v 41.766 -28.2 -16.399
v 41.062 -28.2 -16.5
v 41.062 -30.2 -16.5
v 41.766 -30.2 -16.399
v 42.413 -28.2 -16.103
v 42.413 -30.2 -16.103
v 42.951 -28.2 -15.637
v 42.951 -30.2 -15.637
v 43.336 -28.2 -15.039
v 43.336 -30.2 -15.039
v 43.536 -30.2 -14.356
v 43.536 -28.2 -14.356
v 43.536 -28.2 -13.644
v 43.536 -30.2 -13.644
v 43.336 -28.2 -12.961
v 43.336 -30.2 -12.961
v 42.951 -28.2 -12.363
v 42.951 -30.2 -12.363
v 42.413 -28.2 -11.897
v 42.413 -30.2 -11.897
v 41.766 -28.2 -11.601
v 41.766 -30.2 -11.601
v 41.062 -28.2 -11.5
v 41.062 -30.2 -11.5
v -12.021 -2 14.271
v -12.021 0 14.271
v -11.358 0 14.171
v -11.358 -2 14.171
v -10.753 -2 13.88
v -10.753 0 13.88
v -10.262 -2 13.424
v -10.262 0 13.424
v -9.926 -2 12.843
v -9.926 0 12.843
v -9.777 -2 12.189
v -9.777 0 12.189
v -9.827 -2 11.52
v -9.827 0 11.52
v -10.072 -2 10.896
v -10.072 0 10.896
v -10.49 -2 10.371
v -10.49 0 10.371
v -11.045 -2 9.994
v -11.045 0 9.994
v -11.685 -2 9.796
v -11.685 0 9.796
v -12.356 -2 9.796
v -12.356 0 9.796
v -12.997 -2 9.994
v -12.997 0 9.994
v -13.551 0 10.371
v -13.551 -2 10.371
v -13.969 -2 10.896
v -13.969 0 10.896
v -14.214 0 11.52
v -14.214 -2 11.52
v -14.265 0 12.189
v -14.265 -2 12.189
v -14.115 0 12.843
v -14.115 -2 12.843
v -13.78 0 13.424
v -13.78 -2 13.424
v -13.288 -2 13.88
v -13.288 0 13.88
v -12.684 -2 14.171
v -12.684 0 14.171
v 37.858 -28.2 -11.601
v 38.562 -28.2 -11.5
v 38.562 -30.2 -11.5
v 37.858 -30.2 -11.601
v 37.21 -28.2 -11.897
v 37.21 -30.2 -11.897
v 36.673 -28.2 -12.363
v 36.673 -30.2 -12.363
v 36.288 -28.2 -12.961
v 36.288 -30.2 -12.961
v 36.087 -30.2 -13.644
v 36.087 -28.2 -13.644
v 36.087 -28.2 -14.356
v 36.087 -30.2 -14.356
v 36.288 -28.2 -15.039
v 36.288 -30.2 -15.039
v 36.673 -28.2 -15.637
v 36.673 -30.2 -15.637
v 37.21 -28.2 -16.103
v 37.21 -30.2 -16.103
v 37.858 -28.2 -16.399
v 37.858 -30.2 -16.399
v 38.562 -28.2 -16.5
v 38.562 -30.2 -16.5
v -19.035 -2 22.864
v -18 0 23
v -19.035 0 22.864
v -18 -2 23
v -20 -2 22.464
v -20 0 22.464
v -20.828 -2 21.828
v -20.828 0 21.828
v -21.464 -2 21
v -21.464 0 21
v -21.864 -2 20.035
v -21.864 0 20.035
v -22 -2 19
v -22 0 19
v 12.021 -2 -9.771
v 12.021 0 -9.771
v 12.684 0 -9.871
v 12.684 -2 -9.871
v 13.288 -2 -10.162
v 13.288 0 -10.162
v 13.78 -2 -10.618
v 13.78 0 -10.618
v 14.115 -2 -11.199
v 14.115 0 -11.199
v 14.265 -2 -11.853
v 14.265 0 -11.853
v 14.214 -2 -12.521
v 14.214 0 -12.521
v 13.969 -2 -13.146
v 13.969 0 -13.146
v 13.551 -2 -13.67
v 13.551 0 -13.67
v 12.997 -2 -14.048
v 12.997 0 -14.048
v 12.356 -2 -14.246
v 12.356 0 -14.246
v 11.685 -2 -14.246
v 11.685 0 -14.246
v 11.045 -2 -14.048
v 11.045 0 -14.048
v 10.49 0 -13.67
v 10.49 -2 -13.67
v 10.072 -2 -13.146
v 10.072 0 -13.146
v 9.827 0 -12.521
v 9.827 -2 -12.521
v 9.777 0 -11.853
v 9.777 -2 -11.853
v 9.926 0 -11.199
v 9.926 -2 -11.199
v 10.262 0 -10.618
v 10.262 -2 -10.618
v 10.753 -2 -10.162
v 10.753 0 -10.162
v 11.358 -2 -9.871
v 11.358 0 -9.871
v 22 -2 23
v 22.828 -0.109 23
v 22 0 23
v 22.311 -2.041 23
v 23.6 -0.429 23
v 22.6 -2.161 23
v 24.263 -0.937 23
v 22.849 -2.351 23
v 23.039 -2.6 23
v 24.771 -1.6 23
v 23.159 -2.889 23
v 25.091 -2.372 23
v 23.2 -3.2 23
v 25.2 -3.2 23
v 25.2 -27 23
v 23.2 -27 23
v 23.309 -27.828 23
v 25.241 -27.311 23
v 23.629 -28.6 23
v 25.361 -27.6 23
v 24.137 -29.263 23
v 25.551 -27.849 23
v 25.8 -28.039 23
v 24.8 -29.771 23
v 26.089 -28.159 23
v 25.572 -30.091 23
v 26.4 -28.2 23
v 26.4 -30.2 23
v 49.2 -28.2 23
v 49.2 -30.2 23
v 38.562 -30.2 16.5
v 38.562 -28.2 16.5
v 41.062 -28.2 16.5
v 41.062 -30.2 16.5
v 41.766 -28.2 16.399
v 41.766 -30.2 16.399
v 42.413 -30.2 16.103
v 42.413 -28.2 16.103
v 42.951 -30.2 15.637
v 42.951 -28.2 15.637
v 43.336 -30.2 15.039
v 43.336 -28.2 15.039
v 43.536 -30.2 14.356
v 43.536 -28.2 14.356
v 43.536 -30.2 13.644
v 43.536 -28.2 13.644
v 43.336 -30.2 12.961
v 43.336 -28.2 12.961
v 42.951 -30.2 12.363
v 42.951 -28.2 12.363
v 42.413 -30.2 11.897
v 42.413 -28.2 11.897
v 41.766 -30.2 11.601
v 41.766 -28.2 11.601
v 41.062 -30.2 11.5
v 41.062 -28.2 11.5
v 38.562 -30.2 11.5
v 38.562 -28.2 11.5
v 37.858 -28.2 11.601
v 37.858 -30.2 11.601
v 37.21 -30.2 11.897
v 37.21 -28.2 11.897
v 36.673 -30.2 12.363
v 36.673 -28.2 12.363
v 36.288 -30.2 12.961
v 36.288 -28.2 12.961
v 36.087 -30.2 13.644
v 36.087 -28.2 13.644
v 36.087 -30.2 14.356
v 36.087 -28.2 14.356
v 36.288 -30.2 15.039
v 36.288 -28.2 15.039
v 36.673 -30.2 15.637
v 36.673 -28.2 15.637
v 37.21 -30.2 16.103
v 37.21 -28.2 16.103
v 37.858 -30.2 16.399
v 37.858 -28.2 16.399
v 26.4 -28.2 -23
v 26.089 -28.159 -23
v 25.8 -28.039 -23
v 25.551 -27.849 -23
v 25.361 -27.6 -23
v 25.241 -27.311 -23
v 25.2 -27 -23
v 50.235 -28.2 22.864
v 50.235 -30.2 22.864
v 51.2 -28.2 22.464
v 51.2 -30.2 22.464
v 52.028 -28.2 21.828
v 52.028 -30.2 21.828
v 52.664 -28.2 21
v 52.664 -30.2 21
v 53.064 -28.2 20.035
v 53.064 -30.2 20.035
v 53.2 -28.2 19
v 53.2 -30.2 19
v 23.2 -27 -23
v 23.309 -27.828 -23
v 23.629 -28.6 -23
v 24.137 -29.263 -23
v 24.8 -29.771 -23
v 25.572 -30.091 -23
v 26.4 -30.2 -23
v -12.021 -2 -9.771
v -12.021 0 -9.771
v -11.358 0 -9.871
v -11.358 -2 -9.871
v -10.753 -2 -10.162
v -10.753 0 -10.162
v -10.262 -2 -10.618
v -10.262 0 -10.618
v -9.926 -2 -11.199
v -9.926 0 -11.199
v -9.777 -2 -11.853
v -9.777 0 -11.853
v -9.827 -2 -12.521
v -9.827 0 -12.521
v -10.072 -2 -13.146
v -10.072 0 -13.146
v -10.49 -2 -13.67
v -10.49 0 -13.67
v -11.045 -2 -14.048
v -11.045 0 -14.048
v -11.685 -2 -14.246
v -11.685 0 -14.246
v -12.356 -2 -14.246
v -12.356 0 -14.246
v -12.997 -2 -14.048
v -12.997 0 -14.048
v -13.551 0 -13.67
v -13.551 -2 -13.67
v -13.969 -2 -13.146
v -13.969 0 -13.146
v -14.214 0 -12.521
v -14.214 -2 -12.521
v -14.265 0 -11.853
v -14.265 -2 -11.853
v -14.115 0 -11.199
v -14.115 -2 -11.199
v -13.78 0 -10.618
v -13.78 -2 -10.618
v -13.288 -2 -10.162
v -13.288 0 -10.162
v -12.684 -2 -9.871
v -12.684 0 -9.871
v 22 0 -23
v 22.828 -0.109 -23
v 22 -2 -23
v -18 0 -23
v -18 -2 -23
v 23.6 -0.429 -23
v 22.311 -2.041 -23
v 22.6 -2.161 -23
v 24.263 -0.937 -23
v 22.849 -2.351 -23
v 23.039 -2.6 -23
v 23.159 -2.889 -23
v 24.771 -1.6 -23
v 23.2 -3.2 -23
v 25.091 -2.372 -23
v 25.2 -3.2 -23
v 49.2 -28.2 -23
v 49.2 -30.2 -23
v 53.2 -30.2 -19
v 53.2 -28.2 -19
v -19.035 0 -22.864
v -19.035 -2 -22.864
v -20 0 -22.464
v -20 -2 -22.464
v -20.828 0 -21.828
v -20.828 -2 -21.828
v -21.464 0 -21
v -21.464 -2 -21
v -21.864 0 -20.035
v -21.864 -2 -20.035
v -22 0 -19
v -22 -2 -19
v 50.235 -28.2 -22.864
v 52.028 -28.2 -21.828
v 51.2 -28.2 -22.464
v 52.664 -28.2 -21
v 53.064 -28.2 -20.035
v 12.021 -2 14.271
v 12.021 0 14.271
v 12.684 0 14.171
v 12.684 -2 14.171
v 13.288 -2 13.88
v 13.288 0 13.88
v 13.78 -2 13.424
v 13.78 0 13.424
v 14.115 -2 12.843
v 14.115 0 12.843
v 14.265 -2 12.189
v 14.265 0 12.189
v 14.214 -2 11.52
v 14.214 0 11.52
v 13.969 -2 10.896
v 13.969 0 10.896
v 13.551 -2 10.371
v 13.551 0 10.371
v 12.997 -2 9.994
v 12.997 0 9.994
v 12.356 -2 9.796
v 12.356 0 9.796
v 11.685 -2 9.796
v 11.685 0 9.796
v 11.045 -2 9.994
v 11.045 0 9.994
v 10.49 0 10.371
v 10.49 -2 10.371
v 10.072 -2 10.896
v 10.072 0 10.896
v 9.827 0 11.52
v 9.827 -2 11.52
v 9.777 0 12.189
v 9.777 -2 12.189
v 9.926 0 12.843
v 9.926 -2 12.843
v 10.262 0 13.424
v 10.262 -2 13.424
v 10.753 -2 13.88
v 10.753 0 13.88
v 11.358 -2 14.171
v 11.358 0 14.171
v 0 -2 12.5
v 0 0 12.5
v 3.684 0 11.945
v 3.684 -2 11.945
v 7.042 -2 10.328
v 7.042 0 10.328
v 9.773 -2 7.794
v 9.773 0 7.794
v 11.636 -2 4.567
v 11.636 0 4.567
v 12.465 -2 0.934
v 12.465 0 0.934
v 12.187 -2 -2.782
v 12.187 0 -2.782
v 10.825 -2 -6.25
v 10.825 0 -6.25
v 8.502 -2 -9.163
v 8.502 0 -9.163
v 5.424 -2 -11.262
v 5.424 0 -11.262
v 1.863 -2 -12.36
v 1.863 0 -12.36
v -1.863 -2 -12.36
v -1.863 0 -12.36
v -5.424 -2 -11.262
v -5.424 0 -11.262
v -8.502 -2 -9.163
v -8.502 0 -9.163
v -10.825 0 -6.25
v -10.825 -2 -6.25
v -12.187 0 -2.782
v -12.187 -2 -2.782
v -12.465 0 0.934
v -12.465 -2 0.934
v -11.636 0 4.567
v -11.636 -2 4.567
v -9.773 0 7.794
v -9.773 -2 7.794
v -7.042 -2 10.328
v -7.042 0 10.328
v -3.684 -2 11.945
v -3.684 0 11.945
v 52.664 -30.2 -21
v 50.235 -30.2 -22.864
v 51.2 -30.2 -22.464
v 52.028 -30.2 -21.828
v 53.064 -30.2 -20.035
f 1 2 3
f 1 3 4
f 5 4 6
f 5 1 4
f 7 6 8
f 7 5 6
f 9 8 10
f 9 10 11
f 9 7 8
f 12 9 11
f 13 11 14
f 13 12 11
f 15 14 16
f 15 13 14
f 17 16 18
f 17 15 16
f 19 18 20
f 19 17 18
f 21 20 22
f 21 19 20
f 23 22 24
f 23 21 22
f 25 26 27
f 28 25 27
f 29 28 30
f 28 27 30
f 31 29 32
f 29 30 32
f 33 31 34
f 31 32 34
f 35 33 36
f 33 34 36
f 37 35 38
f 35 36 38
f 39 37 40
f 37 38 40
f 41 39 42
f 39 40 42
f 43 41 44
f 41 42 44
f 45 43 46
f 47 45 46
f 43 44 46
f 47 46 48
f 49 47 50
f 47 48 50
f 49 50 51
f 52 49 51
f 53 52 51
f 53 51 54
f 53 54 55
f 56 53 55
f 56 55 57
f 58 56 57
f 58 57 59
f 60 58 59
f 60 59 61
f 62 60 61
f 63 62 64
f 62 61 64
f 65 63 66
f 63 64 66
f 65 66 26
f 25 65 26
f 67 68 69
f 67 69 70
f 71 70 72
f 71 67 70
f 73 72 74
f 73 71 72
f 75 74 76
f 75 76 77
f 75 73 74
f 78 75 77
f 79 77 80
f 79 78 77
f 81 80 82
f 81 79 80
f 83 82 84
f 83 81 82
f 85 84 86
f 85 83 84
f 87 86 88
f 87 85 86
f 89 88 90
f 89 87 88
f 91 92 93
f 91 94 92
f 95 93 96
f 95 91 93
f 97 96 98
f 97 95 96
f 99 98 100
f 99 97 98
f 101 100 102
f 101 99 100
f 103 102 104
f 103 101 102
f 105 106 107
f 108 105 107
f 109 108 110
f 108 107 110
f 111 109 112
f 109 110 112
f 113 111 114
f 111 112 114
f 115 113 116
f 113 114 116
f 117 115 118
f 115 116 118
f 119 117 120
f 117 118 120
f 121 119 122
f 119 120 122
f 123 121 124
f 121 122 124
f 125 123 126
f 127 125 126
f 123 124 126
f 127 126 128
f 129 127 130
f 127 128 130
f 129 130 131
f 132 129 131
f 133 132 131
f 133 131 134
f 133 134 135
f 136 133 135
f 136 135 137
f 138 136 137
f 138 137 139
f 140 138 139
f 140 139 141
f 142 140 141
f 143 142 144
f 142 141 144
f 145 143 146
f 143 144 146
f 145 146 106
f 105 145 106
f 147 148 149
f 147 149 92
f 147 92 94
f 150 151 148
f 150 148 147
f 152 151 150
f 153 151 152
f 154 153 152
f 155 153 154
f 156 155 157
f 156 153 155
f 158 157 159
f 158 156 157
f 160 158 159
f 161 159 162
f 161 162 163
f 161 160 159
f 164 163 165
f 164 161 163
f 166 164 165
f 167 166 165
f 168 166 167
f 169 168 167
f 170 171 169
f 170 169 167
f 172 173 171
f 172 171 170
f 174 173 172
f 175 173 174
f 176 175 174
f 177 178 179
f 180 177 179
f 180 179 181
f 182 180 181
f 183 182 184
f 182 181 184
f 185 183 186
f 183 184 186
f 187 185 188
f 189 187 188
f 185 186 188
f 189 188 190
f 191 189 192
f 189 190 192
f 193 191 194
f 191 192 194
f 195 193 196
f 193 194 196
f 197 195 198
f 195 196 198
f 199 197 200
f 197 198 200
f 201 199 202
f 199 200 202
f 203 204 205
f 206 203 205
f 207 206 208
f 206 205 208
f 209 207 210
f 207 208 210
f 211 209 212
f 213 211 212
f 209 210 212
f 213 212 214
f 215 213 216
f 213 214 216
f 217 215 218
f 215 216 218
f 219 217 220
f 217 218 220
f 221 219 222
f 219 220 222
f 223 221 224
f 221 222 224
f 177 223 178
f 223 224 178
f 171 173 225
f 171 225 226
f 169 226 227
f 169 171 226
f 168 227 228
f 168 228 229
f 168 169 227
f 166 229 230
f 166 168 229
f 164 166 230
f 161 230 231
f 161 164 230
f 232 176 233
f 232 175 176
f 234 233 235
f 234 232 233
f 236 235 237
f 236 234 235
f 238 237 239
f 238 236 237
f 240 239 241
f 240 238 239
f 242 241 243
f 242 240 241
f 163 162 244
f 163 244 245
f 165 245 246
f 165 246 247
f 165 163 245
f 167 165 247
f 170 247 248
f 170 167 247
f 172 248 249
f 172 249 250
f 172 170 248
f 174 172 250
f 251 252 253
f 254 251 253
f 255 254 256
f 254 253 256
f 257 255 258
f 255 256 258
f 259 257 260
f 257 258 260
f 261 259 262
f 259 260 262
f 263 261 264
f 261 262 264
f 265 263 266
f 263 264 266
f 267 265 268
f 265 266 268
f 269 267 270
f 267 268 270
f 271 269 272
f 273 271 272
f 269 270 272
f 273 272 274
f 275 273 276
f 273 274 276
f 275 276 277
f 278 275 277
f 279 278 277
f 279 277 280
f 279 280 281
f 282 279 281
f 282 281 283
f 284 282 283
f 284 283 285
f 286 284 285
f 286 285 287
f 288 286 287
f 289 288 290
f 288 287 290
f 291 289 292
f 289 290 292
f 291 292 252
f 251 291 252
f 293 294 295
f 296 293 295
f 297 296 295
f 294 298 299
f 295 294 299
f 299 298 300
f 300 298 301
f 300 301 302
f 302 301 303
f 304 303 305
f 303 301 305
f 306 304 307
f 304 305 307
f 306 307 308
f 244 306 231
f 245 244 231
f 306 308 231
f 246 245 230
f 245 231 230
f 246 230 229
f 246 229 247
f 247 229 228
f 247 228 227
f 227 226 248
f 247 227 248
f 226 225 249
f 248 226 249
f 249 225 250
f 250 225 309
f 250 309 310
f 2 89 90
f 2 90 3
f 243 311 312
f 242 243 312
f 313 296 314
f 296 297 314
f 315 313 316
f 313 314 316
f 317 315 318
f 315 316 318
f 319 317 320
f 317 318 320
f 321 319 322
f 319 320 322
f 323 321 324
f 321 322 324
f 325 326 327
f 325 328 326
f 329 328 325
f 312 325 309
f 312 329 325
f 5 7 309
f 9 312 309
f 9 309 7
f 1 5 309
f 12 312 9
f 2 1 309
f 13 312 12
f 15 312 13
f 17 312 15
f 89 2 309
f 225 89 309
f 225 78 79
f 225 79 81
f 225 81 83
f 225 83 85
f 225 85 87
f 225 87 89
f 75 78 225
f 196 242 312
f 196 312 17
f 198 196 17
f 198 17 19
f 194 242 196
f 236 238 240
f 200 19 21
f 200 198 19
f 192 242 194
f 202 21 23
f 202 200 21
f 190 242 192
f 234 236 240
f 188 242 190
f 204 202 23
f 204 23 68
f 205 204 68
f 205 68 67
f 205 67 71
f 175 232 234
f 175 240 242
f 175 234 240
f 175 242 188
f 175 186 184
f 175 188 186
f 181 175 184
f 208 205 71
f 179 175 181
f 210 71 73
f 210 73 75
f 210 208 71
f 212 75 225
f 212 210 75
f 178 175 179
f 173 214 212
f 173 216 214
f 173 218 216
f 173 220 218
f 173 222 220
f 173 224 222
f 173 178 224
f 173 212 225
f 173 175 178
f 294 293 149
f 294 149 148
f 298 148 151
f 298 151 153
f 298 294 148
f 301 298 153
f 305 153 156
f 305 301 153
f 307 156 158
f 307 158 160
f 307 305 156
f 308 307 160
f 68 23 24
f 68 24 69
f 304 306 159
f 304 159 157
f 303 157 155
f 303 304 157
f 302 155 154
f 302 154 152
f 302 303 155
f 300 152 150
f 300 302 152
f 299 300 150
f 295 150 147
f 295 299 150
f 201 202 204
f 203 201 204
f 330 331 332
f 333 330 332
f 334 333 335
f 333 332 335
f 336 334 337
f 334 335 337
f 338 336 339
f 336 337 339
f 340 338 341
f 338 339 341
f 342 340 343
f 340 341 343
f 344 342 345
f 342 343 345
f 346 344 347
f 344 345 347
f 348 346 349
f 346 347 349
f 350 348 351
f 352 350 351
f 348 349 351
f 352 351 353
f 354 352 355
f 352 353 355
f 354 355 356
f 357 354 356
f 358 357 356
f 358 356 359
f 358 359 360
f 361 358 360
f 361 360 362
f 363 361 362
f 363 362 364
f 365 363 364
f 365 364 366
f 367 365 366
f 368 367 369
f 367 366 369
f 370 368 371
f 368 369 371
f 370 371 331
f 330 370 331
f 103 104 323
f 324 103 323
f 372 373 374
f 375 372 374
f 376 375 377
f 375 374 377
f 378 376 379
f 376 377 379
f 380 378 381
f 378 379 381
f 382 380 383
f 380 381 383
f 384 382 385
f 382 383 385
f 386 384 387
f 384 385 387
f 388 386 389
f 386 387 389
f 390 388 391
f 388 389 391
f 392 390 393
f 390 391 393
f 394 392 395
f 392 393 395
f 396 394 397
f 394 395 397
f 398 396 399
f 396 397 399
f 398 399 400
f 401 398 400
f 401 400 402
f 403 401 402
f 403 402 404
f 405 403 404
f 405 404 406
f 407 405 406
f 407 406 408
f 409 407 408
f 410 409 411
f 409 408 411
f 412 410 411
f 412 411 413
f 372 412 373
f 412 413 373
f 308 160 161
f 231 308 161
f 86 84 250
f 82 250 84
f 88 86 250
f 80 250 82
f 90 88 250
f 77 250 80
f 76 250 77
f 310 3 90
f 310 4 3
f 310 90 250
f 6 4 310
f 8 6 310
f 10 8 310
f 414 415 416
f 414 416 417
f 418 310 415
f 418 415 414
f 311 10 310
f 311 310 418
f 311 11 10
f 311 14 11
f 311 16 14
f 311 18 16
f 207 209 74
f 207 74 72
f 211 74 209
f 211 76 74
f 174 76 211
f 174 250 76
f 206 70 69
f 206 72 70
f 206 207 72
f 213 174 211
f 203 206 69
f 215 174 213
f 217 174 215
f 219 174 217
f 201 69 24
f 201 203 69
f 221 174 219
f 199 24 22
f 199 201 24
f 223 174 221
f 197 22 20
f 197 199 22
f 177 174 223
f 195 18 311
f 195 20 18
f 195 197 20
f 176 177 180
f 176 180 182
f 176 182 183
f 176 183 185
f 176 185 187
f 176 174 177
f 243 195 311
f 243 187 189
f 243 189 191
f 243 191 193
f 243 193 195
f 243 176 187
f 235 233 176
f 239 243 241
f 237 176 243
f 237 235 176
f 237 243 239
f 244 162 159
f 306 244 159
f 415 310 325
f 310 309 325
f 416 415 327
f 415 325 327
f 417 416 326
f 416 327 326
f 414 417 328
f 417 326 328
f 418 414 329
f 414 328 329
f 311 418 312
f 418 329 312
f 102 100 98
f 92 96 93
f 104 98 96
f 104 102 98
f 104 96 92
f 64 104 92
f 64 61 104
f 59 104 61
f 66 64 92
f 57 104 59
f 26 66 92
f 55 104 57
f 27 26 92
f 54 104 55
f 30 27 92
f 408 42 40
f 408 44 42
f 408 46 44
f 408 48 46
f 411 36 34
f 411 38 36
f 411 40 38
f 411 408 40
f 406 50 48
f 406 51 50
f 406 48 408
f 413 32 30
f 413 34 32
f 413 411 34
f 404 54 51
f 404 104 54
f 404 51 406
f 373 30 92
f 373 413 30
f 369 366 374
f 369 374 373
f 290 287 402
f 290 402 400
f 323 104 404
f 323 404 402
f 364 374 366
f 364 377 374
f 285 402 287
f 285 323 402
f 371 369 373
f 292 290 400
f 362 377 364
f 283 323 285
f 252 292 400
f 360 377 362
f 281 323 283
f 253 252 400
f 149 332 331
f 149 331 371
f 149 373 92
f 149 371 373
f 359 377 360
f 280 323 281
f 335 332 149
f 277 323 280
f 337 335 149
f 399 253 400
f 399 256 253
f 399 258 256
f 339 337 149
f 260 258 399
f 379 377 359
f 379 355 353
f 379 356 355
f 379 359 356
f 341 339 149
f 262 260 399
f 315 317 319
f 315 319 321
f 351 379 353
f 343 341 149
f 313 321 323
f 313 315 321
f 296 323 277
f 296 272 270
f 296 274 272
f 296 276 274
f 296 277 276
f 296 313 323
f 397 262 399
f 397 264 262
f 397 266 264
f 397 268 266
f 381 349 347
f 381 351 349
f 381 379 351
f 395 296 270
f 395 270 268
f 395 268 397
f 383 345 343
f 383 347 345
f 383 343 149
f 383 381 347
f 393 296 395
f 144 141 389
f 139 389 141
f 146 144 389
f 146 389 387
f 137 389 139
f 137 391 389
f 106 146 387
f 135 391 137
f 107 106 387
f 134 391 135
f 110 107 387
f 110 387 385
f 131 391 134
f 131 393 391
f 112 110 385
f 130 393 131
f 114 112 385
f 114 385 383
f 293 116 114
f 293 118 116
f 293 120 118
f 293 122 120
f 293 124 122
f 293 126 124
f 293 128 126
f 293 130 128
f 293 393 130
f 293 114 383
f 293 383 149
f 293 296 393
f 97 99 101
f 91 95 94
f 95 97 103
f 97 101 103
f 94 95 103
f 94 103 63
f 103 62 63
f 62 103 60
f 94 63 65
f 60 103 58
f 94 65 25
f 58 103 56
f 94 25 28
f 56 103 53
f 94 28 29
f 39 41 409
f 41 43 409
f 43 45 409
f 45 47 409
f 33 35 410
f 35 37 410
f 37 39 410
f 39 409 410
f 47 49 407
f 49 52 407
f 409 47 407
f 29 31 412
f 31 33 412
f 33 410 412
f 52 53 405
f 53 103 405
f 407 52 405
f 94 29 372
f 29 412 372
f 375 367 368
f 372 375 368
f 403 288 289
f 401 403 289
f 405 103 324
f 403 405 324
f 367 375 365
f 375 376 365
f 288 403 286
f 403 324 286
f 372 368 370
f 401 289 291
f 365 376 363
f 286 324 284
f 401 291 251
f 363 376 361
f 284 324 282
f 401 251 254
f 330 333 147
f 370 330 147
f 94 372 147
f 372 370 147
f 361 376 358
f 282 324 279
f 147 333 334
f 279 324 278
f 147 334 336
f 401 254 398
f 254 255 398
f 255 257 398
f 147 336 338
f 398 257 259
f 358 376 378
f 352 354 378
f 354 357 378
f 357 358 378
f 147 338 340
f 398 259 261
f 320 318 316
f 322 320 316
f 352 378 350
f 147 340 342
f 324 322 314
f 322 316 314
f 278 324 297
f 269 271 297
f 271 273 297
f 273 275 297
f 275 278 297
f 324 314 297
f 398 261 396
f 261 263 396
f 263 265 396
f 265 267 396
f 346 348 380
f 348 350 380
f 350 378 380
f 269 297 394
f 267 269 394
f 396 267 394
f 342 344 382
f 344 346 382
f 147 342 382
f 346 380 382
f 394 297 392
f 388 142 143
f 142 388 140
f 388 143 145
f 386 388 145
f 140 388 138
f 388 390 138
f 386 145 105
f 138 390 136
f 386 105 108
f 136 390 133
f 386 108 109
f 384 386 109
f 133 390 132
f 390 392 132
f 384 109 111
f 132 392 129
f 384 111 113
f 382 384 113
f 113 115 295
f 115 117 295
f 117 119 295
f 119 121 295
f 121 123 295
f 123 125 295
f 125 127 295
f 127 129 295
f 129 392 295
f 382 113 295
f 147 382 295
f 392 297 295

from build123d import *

# Parameters (mm, degrees)
SKETCH1_W          = 44
SKETCH1_H          = 46
SKETCH1_R          = 12.5
SKETCH1_R_2        = 2.25
BASE_FLANGE1_DEPTH = 2
EDGE_FLANGE1_DEPTH = 46
EDGE_FLANGE2_DEPTH = 46
CUT_EXTRUDE1_DEPTH = 2
FILLET1_R          = 4


# Sheet-metal steps are written as plain solids
with BuildPart() as part:
    # Sketch1 → Base-Flange1 (new body)
    with BuildSketch(Plane(origin=(0, 0, 0), x_dir=(1, 0, 0), z_dir=(0, 1, 0))):
        Rectangle(SKETCH1_W, SKETCH1_H)
        with Locations(Location((0, 0, 0), (0, 0, 270))):
            Circle(SKETCH1_R, mode=Mode.SUBTRACT)
        with Locations(Location((12.02081528, 12.02081528, 0), (0, 0, 270))):
            Circle(SKETCH1_R_2, mode=Mode.SUBTRACT)
        with Locations(Location((12.02081528, -12.02081528, 0), (0, 0, 270))):
            Circle(SKETCH1_R_2, mode=Mode.SUBTRACT)
        with Locations(Location((-12.02081528, -12.02081528, 0), (0, 0, 270))):
            Circle(SKETCH1_R_2, mode=Mode.SUBTRACT)
        with Locations(Location((-12.02081528, 12.02081528, 0), (0, 0, 270))):
            Circle(SKETCH1_R_2, mode=Mode.SUBTRACT)
    extrude(amount=-BASE_FLANGE1_DEPTH)

    # Edge-Flange1 section (across the edge) → Edge-Flange1 (add)
    with BuildSketch(Plane(origin=(23.2, -2, -23), x_dir=(-1, 0, 0), z_dir=(0, 0, 1))):
        with BuildLine():
            Line((-2, 1.2), (-2, 25))
            Line((-2, 25), (0, 25))
            Line((0, 25), (0, 1.2))
            ThreePointArc((0, 1.2), (0.351471863, 0.351471863), (1.2, 0))
            Line((1.2, 0), (1.2, -2))
            ThreePointArc((1.2, -2), (-1.0627417, -1.0627417), (-2, 1.2))
        make_face()
    extrude(amount=EDGE_FLANGE1_DEPTH)

    # Edge-Flange2 section (across the edge) → Edge-Flange2 (add)
    with BuildSketch(Plane(origin=(25.2, -28.2, 23), x_dir=(0, 1, 0), z_dir=(0, 0, -1))):
        with BuildLine():
            Line((-2, 1.2), (-2, 28))
            Line((-2, 28), (0, 28))
            Line((0, 28), (0, 1.2))
            ThreePointArc((0, 1.2), (0.351471863, 0.351471863), (1.2, 0))
            Line((1.2, 0), (1.2, -2))
            ThreePointArc((1.2, -2), (-1.0627417, -1.0627417), (-2, 1.2))
        make_face()
    extrude(amount=EDGE_FLANGE2_DEPTH)

    # Sketch12 → Cut-Extrude1 (cut)
    with BuildSketch(Plane(origin=(0, -28.2, 0), x_dir=(1, 0, 0), z_dir=(0, 1, 0))):
        with BuildLine():
            Line((38.561884659, 16.5), (41.061884659, 16.5))
            ThreePointArc((41.061884659, 16.5), (43.561884659, 14), (41.061884659, 11.5))
            Line((41.061884659, 11.5), (38.561884659, 11.5))
            ThreePointArc((38.561884659, 11.5), (36.061884659, 14), (38.561884659, 16.5))
        make_face()
        with BuildLine():
            Line((38.561884659, -16.5), (41.061884659, -16.5))
            ThreePointArc((41.061884659, -16.5), (43.561884659, -14), (41.061884659, -11.5))
            Line((41.061884659, -11.5), (38.561884659, -11.5))
            ThreePointArc((38.561884659, -11.5), (36.061884659, -14), (38.561884659, -16.5))
        make_face()
    extrude(amount=-CUT_EXTRUDE1_DEPTH, mode=Mode.SUBTRACT)

    # Fillet1
    fillet1_edges = [part.edges().sort_by_distance(p)[0] for p in [
        (53.2, -29.2, 23),
        (53.2, -29.2, -23),
        (-22, -1, 23),
        (-22, -1, -23),
    ]]
    fillet(fillet1_edges, radius=FILLET1_R)


solid = part.part
